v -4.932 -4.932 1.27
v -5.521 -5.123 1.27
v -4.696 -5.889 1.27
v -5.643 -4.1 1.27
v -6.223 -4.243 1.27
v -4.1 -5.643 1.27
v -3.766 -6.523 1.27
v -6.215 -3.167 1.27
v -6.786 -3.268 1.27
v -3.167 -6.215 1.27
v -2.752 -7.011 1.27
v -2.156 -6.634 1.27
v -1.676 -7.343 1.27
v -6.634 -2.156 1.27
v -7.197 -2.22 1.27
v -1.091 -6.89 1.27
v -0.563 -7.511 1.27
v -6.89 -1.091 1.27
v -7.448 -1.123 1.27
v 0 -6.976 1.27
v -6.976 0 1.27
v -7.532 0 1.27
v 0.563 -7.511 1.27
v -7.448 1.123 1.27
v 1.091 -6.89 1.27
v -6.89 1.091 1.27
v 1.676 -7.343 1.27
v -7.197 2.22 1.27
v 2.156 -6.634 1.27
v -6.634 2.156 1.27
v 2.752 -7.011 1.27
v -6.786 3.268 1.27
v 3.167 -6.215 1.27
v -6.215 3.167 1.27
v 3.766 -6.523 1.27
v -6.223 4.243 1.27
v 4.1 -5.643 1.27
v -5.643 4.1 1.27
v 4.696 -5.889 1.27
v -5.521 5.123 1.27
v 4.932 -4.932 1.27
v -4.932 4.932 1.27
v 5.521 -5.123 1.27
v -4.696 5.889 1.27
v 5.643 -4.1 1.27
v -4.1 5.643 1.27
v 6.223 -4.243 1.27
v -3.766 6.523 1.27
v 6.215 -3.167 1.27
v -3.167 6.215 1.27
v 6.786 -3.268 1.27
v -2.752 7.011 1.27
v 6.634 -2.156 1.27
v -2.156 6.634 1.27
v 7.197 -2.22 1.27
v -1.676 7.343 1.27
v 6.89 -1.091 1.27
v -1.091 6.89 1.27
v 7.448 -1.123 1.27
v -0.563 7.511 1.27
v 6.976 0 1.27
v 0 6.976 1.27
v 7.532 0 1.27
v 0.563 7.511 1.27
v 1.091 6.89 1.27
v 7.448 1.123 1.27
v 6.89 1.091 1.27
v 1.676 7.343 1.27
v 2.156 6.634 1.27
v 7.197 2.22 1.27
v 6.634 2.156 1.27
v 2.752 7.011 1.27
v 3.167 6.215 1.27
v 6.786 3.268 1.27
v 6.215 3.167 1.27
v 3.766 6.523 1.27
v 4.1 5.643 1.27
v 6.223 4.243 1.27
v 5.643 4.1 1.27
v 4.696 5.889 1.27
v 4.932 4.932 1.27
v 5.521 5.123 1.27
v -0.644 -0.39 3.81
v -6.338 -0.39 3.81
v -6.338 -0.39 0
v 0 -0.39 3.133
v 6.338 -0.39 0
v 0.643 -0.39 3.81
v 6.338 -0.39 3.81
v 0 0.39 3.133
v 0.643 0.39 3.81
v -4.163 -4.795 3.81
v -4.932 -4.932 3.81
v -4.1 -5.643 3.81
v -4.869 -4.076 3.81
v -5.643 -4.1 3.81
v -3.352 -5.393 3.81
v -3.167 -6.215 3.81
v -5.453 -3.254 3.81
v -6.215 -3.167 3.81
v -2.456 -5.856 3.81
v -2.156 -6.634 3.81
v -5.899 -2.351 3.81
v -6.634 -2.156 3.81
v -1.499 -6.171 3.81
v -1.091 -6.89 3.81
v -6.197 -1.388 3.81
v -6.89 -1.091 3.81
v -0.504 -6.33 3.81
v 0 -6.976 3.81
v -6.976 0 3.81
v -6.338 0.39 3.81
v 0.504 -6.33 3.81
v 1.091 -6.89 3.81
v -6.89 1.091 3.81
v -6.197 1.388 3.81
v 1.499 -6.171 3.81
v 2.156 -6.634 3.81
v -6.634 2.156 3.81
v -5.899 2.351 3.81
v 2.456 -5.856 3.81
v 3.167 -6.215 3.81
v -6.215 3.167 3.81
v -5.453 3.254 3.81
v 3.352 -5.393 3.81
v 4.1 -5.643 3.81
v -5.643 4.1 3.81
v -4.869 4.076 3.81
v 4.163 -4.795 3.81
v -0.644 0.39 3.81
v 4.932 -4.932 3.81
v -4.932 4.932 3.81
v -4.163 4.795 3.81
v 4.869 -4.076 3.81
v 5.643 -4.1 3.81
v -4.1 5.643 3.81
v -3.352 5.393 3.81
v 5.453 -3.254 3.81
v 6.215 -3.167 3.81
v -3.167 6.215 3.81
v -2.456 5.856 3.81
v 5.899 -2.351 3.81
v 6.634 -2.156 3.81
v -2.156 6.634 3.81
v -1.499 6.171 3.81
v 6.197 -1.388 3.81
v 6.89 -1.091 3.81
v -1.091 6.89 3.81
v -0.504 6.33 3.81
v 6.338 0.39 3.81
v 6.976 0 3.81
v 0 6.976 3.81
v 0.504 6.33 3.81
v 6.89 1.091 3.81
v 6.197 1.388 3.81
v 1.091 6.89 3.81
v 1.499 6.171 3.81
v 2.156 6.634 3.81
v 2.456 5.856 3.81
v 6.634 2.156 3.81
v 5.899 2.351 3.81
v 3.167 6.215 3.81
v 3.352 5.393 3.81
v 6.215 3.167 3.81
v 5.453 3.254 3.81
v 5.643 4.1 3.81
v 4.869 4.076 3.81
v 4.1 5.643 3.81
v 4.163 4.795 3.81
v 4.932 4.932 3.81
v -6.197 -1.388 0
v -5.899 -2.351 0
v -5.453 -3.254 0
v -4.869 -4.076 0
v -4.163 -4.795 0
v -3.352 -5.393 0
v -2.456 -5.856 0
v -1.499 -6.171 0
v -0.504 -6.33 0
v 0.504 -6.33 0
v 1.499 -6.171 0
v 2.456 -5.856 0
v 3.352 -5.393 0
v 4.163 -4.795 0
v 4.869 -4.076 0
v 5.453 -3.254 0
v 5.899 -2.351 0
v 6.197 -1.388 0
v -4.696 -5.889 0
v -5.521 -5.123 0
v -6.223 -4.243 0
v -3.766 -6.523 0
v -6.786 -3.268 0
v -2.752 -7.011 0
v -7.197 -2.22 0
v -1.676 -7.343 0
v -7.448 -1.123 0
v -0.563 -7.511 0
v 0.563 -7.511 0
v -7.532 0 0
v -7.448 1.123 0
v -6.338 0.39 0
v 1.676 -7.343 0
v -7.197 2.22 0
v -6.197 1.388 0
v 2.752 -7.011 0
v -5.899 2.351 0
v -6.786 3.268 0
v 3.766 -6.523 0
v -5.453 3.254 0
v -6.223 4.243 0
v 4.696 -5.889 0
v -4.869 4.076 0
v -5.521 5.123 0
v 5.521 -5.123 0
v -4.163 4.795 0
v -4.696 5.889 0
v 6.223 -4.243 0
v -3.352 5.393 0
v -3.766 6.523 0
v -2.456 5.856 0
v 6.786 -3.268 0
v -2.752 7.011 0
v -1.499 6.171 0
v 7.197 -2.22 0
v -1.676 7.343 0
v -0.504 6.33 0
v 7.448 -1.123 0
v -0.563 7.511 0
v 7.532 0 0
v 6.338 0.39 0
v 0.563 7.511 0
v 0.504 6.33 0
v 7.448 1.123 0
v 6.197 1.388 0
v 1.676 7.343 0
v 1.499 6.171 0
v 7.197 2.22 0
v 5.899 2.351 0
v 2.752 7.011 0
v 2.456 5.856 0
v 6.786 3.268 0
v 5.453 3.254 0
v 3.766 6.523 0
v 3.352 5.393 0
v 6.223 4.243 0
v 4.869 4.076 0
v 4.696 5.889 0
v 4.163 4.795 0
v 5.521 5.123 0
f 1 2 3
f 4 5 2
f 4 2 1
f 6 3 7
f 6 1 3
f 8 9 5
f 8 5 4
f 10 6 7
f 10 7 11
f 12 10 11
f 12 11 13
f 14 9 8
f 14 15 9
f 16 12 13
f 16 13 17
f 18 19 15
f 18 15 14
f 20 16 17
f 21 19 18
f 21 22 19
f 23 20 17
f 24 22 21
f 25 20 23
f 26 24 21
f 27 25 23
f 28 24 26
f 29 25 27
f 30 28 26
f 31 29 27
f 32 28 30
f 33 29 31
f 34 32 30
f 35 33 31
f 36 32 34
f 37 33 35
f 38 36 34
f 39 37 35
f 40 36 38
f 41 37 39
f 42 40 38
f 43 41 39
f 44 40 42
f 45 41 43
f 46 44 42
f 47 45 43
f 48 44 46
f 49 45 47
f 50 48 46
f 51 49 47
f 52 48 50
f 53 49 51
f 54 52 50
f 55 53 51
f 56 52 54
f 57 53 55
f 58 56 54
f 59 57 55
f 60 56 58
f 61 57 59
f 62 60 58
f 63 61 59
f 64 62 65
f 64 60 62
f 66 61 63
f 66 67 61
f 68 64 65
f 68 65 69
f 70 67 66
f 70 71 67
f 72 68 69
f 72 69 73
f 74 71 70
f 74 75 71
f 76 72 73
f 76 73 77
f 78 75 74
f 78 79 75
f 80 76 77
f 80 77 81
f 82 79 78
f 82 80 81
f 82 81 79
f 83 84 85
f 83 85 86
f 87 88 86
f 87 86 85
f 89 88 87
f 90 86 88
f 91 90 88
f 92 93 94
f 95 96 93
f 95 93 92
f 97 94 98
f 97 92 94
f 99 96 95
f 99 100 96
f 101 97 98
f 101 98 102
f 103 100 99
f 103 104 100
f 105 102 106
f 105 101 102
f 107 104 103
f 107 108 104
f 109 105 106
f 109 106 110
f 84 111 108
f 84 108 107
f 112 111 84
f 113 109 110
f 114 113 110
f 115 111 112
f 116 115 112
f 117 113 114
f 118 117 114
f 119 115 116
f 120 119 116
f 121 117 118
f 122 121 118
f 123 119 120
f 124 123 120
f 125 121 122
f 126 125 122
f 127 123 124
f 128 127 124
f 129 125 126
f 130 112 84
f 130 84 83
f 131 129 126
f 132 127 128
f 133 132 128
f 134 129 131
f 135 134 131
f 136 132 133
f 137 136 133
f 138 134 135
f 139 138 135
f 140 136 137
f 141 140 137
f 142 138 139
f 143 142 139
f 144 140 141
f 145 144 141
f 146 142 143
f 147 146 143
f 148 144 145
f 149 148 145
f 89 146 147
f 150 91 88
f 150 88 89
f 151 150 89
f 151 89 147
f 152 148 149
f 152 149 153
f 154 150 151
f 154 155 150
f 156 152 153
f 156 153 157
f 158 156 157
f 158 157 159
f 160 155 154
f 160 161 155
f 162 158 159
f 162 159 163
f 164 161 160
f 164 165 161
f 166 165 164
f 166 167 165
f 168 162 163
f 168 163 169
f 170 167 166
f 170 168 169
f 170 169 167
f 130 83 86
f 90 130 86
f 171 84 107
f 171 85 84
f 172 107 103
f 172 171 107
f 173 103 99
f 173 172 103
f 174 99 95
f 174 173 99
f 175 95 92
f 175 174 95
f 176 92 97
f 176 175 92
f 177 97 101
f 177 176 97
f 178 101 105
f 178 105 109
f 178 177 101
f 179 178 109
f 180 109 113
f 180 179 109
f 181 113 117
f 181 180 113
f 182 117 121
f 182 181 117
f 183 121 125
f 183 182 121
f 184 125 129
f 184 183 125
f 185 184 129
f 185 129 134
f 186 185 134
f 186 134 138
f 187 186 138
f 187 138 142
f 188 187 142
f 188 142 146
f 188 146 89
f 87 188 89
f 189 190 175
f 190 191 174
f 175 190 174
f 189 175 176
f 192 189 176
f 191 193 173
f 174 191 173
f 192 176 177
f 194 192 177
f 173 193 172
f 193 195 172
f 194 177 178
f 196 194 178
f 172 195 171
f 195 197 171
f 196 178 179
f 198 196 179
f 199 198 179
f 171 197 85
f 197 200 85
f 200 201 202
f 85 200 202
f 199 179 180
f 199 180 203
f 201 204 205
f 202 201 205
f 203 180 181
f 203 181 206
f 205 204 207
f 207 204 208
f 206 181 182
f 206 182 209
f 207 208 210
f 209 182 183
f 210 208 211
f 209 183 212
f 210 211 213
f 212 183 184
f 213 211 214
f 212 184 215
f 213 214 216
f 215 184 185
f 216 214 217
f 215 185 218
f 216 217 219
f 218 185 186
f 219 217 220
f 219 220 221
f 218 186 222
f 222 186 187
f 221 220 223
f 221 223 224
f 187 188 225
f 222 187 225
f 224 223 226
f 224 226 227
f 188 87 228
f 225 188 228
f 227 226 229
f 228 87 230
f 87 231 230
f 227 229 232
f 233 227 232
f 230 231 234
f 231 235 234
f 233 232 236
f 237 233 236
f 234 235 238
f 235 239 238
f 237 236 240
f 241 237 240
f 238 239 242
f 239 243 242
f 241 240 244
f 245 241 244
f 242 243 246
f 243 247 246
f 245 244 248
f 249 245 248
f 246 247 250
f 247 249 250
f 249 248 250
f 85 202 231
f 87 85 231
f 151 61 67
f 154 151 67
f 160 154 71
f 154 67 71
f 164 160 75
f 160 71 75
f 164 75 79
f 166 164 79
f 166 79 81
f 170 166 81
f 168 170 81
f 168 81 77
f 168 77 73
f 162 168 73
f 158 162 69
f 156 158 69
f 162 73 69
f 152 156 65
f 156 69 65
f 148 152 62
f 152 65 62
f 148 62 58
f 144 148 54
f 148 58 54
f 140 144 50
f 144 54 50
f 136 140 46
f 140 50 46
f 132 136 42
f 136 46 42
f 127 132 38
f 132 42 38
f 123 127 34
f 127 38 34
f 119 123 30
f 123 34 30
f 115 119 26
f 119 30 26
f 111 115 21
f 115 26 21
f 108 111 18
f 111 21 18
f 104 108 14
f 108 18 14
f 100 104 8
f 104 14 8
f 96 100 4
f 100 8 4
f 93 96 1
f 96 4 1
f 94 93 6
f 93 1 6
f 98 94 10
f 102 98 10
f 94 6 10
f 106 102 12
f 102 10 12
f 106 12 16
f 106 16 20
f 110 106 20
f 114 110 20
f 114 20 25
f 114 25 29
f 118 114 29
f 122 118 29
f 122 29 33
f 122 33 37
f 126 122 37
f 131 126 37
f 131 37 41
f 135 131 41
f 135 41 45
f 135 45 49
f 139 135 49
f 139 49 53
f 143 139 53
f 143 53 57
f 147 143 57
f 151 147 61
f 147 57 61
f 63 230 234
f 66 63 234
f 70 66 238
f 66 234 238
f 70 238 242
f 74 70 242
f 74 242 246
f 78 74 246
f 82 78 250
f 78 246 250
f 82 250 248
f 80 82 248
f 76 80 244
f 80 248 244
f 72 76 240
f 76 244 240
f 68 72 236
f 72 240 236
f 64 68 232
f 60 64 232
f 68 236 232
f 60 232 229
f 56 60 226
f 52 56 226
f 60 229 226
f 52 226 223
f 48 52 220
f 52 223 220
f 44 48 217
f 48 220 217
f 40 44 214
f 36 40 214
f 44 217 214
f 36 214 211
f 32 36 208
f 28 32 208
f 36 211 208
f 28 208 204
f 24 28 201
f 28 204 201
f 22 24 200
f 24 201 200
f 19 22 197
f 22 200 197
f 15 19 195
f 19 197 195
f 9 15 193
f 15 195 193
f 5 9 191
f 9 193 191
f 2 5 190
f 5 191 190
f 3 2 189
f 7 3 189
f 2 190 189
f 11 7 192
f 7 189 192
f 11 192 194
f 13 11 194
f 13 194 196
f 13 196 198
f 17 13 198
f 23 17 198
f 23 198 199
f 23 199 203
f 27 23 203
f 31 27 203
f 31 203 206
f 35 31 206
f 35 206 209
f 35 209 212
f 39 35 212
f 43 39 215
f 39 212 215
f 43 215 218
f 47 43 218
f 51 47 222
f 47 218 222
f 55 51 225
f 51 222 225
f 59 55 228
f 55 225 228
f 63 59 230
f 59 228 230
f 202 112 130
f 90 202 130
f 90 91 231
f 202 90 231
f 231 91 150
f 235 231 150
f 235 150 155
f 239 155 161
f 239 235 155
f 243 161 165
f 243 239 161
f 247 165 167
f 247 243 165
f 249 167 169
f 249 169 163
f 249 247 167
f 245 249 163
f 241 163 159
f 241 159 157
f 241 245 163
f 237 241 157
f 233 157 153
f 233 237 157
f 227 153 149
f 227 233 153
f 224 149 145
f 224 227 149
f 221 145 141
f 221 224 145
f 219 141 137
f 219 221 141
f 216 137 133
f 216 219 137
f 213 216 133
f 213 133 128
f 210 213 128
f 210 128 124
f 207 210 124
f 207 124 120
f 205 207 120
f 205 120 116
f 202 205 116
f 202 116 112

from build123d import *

# Parameters (mm, degrees)
F0_R     = 7.531741
F0_R_2   = 6.35
F1_DEPTH = 1.27
F2_R     = 6.97558
F2_R_2   = 6.35
F3_DEPTH = 2.54
F5_W     = 13.57171
F5_H     = 0.779712
F6_DEPTH = 3.81
F8_DEPTH = 2.54


with BuildPart() as f1:
    # F0 (on Top) → F1 (new body)
    with BuildSketch(Plane.XY):
        Circle(F0_R)
        Circle(F0_R_2, mode=Mode.SUBTRACT)
    extrude(amount=F1_DEPTH)

    # F2 (on face) → F3 (join)
    with BuildSketch(Plane.XY.offset(1.27)):
        Circle(F2_R)
        Circle(F2_R_2, mode=Mode.SUBTRACT)
    extrude(amount=F3_DEPTH)

    # F5 (on face) → F6 (join)
    with BuildSketch(Plane.XY.offset(3.81)):
        Rectangle(F5_W, F5_H)
    extrude(amount=-F6_DEPTH)

    # F7 (on face) → F8 (cut)
    with BuildSketch(Plane.XZ.offset(0.389856)):
        Polygon((0.642504, 3.81), (0, 3.81), (0, 3.132625), align=None)
        Polygon((0, 3.132625), (0, 3.81), (-0.644351, 3.81), align=None)
    extrude(amount=-F8_DEPTH, mode=Mode.SUBTRACT)


solid = f1.part
